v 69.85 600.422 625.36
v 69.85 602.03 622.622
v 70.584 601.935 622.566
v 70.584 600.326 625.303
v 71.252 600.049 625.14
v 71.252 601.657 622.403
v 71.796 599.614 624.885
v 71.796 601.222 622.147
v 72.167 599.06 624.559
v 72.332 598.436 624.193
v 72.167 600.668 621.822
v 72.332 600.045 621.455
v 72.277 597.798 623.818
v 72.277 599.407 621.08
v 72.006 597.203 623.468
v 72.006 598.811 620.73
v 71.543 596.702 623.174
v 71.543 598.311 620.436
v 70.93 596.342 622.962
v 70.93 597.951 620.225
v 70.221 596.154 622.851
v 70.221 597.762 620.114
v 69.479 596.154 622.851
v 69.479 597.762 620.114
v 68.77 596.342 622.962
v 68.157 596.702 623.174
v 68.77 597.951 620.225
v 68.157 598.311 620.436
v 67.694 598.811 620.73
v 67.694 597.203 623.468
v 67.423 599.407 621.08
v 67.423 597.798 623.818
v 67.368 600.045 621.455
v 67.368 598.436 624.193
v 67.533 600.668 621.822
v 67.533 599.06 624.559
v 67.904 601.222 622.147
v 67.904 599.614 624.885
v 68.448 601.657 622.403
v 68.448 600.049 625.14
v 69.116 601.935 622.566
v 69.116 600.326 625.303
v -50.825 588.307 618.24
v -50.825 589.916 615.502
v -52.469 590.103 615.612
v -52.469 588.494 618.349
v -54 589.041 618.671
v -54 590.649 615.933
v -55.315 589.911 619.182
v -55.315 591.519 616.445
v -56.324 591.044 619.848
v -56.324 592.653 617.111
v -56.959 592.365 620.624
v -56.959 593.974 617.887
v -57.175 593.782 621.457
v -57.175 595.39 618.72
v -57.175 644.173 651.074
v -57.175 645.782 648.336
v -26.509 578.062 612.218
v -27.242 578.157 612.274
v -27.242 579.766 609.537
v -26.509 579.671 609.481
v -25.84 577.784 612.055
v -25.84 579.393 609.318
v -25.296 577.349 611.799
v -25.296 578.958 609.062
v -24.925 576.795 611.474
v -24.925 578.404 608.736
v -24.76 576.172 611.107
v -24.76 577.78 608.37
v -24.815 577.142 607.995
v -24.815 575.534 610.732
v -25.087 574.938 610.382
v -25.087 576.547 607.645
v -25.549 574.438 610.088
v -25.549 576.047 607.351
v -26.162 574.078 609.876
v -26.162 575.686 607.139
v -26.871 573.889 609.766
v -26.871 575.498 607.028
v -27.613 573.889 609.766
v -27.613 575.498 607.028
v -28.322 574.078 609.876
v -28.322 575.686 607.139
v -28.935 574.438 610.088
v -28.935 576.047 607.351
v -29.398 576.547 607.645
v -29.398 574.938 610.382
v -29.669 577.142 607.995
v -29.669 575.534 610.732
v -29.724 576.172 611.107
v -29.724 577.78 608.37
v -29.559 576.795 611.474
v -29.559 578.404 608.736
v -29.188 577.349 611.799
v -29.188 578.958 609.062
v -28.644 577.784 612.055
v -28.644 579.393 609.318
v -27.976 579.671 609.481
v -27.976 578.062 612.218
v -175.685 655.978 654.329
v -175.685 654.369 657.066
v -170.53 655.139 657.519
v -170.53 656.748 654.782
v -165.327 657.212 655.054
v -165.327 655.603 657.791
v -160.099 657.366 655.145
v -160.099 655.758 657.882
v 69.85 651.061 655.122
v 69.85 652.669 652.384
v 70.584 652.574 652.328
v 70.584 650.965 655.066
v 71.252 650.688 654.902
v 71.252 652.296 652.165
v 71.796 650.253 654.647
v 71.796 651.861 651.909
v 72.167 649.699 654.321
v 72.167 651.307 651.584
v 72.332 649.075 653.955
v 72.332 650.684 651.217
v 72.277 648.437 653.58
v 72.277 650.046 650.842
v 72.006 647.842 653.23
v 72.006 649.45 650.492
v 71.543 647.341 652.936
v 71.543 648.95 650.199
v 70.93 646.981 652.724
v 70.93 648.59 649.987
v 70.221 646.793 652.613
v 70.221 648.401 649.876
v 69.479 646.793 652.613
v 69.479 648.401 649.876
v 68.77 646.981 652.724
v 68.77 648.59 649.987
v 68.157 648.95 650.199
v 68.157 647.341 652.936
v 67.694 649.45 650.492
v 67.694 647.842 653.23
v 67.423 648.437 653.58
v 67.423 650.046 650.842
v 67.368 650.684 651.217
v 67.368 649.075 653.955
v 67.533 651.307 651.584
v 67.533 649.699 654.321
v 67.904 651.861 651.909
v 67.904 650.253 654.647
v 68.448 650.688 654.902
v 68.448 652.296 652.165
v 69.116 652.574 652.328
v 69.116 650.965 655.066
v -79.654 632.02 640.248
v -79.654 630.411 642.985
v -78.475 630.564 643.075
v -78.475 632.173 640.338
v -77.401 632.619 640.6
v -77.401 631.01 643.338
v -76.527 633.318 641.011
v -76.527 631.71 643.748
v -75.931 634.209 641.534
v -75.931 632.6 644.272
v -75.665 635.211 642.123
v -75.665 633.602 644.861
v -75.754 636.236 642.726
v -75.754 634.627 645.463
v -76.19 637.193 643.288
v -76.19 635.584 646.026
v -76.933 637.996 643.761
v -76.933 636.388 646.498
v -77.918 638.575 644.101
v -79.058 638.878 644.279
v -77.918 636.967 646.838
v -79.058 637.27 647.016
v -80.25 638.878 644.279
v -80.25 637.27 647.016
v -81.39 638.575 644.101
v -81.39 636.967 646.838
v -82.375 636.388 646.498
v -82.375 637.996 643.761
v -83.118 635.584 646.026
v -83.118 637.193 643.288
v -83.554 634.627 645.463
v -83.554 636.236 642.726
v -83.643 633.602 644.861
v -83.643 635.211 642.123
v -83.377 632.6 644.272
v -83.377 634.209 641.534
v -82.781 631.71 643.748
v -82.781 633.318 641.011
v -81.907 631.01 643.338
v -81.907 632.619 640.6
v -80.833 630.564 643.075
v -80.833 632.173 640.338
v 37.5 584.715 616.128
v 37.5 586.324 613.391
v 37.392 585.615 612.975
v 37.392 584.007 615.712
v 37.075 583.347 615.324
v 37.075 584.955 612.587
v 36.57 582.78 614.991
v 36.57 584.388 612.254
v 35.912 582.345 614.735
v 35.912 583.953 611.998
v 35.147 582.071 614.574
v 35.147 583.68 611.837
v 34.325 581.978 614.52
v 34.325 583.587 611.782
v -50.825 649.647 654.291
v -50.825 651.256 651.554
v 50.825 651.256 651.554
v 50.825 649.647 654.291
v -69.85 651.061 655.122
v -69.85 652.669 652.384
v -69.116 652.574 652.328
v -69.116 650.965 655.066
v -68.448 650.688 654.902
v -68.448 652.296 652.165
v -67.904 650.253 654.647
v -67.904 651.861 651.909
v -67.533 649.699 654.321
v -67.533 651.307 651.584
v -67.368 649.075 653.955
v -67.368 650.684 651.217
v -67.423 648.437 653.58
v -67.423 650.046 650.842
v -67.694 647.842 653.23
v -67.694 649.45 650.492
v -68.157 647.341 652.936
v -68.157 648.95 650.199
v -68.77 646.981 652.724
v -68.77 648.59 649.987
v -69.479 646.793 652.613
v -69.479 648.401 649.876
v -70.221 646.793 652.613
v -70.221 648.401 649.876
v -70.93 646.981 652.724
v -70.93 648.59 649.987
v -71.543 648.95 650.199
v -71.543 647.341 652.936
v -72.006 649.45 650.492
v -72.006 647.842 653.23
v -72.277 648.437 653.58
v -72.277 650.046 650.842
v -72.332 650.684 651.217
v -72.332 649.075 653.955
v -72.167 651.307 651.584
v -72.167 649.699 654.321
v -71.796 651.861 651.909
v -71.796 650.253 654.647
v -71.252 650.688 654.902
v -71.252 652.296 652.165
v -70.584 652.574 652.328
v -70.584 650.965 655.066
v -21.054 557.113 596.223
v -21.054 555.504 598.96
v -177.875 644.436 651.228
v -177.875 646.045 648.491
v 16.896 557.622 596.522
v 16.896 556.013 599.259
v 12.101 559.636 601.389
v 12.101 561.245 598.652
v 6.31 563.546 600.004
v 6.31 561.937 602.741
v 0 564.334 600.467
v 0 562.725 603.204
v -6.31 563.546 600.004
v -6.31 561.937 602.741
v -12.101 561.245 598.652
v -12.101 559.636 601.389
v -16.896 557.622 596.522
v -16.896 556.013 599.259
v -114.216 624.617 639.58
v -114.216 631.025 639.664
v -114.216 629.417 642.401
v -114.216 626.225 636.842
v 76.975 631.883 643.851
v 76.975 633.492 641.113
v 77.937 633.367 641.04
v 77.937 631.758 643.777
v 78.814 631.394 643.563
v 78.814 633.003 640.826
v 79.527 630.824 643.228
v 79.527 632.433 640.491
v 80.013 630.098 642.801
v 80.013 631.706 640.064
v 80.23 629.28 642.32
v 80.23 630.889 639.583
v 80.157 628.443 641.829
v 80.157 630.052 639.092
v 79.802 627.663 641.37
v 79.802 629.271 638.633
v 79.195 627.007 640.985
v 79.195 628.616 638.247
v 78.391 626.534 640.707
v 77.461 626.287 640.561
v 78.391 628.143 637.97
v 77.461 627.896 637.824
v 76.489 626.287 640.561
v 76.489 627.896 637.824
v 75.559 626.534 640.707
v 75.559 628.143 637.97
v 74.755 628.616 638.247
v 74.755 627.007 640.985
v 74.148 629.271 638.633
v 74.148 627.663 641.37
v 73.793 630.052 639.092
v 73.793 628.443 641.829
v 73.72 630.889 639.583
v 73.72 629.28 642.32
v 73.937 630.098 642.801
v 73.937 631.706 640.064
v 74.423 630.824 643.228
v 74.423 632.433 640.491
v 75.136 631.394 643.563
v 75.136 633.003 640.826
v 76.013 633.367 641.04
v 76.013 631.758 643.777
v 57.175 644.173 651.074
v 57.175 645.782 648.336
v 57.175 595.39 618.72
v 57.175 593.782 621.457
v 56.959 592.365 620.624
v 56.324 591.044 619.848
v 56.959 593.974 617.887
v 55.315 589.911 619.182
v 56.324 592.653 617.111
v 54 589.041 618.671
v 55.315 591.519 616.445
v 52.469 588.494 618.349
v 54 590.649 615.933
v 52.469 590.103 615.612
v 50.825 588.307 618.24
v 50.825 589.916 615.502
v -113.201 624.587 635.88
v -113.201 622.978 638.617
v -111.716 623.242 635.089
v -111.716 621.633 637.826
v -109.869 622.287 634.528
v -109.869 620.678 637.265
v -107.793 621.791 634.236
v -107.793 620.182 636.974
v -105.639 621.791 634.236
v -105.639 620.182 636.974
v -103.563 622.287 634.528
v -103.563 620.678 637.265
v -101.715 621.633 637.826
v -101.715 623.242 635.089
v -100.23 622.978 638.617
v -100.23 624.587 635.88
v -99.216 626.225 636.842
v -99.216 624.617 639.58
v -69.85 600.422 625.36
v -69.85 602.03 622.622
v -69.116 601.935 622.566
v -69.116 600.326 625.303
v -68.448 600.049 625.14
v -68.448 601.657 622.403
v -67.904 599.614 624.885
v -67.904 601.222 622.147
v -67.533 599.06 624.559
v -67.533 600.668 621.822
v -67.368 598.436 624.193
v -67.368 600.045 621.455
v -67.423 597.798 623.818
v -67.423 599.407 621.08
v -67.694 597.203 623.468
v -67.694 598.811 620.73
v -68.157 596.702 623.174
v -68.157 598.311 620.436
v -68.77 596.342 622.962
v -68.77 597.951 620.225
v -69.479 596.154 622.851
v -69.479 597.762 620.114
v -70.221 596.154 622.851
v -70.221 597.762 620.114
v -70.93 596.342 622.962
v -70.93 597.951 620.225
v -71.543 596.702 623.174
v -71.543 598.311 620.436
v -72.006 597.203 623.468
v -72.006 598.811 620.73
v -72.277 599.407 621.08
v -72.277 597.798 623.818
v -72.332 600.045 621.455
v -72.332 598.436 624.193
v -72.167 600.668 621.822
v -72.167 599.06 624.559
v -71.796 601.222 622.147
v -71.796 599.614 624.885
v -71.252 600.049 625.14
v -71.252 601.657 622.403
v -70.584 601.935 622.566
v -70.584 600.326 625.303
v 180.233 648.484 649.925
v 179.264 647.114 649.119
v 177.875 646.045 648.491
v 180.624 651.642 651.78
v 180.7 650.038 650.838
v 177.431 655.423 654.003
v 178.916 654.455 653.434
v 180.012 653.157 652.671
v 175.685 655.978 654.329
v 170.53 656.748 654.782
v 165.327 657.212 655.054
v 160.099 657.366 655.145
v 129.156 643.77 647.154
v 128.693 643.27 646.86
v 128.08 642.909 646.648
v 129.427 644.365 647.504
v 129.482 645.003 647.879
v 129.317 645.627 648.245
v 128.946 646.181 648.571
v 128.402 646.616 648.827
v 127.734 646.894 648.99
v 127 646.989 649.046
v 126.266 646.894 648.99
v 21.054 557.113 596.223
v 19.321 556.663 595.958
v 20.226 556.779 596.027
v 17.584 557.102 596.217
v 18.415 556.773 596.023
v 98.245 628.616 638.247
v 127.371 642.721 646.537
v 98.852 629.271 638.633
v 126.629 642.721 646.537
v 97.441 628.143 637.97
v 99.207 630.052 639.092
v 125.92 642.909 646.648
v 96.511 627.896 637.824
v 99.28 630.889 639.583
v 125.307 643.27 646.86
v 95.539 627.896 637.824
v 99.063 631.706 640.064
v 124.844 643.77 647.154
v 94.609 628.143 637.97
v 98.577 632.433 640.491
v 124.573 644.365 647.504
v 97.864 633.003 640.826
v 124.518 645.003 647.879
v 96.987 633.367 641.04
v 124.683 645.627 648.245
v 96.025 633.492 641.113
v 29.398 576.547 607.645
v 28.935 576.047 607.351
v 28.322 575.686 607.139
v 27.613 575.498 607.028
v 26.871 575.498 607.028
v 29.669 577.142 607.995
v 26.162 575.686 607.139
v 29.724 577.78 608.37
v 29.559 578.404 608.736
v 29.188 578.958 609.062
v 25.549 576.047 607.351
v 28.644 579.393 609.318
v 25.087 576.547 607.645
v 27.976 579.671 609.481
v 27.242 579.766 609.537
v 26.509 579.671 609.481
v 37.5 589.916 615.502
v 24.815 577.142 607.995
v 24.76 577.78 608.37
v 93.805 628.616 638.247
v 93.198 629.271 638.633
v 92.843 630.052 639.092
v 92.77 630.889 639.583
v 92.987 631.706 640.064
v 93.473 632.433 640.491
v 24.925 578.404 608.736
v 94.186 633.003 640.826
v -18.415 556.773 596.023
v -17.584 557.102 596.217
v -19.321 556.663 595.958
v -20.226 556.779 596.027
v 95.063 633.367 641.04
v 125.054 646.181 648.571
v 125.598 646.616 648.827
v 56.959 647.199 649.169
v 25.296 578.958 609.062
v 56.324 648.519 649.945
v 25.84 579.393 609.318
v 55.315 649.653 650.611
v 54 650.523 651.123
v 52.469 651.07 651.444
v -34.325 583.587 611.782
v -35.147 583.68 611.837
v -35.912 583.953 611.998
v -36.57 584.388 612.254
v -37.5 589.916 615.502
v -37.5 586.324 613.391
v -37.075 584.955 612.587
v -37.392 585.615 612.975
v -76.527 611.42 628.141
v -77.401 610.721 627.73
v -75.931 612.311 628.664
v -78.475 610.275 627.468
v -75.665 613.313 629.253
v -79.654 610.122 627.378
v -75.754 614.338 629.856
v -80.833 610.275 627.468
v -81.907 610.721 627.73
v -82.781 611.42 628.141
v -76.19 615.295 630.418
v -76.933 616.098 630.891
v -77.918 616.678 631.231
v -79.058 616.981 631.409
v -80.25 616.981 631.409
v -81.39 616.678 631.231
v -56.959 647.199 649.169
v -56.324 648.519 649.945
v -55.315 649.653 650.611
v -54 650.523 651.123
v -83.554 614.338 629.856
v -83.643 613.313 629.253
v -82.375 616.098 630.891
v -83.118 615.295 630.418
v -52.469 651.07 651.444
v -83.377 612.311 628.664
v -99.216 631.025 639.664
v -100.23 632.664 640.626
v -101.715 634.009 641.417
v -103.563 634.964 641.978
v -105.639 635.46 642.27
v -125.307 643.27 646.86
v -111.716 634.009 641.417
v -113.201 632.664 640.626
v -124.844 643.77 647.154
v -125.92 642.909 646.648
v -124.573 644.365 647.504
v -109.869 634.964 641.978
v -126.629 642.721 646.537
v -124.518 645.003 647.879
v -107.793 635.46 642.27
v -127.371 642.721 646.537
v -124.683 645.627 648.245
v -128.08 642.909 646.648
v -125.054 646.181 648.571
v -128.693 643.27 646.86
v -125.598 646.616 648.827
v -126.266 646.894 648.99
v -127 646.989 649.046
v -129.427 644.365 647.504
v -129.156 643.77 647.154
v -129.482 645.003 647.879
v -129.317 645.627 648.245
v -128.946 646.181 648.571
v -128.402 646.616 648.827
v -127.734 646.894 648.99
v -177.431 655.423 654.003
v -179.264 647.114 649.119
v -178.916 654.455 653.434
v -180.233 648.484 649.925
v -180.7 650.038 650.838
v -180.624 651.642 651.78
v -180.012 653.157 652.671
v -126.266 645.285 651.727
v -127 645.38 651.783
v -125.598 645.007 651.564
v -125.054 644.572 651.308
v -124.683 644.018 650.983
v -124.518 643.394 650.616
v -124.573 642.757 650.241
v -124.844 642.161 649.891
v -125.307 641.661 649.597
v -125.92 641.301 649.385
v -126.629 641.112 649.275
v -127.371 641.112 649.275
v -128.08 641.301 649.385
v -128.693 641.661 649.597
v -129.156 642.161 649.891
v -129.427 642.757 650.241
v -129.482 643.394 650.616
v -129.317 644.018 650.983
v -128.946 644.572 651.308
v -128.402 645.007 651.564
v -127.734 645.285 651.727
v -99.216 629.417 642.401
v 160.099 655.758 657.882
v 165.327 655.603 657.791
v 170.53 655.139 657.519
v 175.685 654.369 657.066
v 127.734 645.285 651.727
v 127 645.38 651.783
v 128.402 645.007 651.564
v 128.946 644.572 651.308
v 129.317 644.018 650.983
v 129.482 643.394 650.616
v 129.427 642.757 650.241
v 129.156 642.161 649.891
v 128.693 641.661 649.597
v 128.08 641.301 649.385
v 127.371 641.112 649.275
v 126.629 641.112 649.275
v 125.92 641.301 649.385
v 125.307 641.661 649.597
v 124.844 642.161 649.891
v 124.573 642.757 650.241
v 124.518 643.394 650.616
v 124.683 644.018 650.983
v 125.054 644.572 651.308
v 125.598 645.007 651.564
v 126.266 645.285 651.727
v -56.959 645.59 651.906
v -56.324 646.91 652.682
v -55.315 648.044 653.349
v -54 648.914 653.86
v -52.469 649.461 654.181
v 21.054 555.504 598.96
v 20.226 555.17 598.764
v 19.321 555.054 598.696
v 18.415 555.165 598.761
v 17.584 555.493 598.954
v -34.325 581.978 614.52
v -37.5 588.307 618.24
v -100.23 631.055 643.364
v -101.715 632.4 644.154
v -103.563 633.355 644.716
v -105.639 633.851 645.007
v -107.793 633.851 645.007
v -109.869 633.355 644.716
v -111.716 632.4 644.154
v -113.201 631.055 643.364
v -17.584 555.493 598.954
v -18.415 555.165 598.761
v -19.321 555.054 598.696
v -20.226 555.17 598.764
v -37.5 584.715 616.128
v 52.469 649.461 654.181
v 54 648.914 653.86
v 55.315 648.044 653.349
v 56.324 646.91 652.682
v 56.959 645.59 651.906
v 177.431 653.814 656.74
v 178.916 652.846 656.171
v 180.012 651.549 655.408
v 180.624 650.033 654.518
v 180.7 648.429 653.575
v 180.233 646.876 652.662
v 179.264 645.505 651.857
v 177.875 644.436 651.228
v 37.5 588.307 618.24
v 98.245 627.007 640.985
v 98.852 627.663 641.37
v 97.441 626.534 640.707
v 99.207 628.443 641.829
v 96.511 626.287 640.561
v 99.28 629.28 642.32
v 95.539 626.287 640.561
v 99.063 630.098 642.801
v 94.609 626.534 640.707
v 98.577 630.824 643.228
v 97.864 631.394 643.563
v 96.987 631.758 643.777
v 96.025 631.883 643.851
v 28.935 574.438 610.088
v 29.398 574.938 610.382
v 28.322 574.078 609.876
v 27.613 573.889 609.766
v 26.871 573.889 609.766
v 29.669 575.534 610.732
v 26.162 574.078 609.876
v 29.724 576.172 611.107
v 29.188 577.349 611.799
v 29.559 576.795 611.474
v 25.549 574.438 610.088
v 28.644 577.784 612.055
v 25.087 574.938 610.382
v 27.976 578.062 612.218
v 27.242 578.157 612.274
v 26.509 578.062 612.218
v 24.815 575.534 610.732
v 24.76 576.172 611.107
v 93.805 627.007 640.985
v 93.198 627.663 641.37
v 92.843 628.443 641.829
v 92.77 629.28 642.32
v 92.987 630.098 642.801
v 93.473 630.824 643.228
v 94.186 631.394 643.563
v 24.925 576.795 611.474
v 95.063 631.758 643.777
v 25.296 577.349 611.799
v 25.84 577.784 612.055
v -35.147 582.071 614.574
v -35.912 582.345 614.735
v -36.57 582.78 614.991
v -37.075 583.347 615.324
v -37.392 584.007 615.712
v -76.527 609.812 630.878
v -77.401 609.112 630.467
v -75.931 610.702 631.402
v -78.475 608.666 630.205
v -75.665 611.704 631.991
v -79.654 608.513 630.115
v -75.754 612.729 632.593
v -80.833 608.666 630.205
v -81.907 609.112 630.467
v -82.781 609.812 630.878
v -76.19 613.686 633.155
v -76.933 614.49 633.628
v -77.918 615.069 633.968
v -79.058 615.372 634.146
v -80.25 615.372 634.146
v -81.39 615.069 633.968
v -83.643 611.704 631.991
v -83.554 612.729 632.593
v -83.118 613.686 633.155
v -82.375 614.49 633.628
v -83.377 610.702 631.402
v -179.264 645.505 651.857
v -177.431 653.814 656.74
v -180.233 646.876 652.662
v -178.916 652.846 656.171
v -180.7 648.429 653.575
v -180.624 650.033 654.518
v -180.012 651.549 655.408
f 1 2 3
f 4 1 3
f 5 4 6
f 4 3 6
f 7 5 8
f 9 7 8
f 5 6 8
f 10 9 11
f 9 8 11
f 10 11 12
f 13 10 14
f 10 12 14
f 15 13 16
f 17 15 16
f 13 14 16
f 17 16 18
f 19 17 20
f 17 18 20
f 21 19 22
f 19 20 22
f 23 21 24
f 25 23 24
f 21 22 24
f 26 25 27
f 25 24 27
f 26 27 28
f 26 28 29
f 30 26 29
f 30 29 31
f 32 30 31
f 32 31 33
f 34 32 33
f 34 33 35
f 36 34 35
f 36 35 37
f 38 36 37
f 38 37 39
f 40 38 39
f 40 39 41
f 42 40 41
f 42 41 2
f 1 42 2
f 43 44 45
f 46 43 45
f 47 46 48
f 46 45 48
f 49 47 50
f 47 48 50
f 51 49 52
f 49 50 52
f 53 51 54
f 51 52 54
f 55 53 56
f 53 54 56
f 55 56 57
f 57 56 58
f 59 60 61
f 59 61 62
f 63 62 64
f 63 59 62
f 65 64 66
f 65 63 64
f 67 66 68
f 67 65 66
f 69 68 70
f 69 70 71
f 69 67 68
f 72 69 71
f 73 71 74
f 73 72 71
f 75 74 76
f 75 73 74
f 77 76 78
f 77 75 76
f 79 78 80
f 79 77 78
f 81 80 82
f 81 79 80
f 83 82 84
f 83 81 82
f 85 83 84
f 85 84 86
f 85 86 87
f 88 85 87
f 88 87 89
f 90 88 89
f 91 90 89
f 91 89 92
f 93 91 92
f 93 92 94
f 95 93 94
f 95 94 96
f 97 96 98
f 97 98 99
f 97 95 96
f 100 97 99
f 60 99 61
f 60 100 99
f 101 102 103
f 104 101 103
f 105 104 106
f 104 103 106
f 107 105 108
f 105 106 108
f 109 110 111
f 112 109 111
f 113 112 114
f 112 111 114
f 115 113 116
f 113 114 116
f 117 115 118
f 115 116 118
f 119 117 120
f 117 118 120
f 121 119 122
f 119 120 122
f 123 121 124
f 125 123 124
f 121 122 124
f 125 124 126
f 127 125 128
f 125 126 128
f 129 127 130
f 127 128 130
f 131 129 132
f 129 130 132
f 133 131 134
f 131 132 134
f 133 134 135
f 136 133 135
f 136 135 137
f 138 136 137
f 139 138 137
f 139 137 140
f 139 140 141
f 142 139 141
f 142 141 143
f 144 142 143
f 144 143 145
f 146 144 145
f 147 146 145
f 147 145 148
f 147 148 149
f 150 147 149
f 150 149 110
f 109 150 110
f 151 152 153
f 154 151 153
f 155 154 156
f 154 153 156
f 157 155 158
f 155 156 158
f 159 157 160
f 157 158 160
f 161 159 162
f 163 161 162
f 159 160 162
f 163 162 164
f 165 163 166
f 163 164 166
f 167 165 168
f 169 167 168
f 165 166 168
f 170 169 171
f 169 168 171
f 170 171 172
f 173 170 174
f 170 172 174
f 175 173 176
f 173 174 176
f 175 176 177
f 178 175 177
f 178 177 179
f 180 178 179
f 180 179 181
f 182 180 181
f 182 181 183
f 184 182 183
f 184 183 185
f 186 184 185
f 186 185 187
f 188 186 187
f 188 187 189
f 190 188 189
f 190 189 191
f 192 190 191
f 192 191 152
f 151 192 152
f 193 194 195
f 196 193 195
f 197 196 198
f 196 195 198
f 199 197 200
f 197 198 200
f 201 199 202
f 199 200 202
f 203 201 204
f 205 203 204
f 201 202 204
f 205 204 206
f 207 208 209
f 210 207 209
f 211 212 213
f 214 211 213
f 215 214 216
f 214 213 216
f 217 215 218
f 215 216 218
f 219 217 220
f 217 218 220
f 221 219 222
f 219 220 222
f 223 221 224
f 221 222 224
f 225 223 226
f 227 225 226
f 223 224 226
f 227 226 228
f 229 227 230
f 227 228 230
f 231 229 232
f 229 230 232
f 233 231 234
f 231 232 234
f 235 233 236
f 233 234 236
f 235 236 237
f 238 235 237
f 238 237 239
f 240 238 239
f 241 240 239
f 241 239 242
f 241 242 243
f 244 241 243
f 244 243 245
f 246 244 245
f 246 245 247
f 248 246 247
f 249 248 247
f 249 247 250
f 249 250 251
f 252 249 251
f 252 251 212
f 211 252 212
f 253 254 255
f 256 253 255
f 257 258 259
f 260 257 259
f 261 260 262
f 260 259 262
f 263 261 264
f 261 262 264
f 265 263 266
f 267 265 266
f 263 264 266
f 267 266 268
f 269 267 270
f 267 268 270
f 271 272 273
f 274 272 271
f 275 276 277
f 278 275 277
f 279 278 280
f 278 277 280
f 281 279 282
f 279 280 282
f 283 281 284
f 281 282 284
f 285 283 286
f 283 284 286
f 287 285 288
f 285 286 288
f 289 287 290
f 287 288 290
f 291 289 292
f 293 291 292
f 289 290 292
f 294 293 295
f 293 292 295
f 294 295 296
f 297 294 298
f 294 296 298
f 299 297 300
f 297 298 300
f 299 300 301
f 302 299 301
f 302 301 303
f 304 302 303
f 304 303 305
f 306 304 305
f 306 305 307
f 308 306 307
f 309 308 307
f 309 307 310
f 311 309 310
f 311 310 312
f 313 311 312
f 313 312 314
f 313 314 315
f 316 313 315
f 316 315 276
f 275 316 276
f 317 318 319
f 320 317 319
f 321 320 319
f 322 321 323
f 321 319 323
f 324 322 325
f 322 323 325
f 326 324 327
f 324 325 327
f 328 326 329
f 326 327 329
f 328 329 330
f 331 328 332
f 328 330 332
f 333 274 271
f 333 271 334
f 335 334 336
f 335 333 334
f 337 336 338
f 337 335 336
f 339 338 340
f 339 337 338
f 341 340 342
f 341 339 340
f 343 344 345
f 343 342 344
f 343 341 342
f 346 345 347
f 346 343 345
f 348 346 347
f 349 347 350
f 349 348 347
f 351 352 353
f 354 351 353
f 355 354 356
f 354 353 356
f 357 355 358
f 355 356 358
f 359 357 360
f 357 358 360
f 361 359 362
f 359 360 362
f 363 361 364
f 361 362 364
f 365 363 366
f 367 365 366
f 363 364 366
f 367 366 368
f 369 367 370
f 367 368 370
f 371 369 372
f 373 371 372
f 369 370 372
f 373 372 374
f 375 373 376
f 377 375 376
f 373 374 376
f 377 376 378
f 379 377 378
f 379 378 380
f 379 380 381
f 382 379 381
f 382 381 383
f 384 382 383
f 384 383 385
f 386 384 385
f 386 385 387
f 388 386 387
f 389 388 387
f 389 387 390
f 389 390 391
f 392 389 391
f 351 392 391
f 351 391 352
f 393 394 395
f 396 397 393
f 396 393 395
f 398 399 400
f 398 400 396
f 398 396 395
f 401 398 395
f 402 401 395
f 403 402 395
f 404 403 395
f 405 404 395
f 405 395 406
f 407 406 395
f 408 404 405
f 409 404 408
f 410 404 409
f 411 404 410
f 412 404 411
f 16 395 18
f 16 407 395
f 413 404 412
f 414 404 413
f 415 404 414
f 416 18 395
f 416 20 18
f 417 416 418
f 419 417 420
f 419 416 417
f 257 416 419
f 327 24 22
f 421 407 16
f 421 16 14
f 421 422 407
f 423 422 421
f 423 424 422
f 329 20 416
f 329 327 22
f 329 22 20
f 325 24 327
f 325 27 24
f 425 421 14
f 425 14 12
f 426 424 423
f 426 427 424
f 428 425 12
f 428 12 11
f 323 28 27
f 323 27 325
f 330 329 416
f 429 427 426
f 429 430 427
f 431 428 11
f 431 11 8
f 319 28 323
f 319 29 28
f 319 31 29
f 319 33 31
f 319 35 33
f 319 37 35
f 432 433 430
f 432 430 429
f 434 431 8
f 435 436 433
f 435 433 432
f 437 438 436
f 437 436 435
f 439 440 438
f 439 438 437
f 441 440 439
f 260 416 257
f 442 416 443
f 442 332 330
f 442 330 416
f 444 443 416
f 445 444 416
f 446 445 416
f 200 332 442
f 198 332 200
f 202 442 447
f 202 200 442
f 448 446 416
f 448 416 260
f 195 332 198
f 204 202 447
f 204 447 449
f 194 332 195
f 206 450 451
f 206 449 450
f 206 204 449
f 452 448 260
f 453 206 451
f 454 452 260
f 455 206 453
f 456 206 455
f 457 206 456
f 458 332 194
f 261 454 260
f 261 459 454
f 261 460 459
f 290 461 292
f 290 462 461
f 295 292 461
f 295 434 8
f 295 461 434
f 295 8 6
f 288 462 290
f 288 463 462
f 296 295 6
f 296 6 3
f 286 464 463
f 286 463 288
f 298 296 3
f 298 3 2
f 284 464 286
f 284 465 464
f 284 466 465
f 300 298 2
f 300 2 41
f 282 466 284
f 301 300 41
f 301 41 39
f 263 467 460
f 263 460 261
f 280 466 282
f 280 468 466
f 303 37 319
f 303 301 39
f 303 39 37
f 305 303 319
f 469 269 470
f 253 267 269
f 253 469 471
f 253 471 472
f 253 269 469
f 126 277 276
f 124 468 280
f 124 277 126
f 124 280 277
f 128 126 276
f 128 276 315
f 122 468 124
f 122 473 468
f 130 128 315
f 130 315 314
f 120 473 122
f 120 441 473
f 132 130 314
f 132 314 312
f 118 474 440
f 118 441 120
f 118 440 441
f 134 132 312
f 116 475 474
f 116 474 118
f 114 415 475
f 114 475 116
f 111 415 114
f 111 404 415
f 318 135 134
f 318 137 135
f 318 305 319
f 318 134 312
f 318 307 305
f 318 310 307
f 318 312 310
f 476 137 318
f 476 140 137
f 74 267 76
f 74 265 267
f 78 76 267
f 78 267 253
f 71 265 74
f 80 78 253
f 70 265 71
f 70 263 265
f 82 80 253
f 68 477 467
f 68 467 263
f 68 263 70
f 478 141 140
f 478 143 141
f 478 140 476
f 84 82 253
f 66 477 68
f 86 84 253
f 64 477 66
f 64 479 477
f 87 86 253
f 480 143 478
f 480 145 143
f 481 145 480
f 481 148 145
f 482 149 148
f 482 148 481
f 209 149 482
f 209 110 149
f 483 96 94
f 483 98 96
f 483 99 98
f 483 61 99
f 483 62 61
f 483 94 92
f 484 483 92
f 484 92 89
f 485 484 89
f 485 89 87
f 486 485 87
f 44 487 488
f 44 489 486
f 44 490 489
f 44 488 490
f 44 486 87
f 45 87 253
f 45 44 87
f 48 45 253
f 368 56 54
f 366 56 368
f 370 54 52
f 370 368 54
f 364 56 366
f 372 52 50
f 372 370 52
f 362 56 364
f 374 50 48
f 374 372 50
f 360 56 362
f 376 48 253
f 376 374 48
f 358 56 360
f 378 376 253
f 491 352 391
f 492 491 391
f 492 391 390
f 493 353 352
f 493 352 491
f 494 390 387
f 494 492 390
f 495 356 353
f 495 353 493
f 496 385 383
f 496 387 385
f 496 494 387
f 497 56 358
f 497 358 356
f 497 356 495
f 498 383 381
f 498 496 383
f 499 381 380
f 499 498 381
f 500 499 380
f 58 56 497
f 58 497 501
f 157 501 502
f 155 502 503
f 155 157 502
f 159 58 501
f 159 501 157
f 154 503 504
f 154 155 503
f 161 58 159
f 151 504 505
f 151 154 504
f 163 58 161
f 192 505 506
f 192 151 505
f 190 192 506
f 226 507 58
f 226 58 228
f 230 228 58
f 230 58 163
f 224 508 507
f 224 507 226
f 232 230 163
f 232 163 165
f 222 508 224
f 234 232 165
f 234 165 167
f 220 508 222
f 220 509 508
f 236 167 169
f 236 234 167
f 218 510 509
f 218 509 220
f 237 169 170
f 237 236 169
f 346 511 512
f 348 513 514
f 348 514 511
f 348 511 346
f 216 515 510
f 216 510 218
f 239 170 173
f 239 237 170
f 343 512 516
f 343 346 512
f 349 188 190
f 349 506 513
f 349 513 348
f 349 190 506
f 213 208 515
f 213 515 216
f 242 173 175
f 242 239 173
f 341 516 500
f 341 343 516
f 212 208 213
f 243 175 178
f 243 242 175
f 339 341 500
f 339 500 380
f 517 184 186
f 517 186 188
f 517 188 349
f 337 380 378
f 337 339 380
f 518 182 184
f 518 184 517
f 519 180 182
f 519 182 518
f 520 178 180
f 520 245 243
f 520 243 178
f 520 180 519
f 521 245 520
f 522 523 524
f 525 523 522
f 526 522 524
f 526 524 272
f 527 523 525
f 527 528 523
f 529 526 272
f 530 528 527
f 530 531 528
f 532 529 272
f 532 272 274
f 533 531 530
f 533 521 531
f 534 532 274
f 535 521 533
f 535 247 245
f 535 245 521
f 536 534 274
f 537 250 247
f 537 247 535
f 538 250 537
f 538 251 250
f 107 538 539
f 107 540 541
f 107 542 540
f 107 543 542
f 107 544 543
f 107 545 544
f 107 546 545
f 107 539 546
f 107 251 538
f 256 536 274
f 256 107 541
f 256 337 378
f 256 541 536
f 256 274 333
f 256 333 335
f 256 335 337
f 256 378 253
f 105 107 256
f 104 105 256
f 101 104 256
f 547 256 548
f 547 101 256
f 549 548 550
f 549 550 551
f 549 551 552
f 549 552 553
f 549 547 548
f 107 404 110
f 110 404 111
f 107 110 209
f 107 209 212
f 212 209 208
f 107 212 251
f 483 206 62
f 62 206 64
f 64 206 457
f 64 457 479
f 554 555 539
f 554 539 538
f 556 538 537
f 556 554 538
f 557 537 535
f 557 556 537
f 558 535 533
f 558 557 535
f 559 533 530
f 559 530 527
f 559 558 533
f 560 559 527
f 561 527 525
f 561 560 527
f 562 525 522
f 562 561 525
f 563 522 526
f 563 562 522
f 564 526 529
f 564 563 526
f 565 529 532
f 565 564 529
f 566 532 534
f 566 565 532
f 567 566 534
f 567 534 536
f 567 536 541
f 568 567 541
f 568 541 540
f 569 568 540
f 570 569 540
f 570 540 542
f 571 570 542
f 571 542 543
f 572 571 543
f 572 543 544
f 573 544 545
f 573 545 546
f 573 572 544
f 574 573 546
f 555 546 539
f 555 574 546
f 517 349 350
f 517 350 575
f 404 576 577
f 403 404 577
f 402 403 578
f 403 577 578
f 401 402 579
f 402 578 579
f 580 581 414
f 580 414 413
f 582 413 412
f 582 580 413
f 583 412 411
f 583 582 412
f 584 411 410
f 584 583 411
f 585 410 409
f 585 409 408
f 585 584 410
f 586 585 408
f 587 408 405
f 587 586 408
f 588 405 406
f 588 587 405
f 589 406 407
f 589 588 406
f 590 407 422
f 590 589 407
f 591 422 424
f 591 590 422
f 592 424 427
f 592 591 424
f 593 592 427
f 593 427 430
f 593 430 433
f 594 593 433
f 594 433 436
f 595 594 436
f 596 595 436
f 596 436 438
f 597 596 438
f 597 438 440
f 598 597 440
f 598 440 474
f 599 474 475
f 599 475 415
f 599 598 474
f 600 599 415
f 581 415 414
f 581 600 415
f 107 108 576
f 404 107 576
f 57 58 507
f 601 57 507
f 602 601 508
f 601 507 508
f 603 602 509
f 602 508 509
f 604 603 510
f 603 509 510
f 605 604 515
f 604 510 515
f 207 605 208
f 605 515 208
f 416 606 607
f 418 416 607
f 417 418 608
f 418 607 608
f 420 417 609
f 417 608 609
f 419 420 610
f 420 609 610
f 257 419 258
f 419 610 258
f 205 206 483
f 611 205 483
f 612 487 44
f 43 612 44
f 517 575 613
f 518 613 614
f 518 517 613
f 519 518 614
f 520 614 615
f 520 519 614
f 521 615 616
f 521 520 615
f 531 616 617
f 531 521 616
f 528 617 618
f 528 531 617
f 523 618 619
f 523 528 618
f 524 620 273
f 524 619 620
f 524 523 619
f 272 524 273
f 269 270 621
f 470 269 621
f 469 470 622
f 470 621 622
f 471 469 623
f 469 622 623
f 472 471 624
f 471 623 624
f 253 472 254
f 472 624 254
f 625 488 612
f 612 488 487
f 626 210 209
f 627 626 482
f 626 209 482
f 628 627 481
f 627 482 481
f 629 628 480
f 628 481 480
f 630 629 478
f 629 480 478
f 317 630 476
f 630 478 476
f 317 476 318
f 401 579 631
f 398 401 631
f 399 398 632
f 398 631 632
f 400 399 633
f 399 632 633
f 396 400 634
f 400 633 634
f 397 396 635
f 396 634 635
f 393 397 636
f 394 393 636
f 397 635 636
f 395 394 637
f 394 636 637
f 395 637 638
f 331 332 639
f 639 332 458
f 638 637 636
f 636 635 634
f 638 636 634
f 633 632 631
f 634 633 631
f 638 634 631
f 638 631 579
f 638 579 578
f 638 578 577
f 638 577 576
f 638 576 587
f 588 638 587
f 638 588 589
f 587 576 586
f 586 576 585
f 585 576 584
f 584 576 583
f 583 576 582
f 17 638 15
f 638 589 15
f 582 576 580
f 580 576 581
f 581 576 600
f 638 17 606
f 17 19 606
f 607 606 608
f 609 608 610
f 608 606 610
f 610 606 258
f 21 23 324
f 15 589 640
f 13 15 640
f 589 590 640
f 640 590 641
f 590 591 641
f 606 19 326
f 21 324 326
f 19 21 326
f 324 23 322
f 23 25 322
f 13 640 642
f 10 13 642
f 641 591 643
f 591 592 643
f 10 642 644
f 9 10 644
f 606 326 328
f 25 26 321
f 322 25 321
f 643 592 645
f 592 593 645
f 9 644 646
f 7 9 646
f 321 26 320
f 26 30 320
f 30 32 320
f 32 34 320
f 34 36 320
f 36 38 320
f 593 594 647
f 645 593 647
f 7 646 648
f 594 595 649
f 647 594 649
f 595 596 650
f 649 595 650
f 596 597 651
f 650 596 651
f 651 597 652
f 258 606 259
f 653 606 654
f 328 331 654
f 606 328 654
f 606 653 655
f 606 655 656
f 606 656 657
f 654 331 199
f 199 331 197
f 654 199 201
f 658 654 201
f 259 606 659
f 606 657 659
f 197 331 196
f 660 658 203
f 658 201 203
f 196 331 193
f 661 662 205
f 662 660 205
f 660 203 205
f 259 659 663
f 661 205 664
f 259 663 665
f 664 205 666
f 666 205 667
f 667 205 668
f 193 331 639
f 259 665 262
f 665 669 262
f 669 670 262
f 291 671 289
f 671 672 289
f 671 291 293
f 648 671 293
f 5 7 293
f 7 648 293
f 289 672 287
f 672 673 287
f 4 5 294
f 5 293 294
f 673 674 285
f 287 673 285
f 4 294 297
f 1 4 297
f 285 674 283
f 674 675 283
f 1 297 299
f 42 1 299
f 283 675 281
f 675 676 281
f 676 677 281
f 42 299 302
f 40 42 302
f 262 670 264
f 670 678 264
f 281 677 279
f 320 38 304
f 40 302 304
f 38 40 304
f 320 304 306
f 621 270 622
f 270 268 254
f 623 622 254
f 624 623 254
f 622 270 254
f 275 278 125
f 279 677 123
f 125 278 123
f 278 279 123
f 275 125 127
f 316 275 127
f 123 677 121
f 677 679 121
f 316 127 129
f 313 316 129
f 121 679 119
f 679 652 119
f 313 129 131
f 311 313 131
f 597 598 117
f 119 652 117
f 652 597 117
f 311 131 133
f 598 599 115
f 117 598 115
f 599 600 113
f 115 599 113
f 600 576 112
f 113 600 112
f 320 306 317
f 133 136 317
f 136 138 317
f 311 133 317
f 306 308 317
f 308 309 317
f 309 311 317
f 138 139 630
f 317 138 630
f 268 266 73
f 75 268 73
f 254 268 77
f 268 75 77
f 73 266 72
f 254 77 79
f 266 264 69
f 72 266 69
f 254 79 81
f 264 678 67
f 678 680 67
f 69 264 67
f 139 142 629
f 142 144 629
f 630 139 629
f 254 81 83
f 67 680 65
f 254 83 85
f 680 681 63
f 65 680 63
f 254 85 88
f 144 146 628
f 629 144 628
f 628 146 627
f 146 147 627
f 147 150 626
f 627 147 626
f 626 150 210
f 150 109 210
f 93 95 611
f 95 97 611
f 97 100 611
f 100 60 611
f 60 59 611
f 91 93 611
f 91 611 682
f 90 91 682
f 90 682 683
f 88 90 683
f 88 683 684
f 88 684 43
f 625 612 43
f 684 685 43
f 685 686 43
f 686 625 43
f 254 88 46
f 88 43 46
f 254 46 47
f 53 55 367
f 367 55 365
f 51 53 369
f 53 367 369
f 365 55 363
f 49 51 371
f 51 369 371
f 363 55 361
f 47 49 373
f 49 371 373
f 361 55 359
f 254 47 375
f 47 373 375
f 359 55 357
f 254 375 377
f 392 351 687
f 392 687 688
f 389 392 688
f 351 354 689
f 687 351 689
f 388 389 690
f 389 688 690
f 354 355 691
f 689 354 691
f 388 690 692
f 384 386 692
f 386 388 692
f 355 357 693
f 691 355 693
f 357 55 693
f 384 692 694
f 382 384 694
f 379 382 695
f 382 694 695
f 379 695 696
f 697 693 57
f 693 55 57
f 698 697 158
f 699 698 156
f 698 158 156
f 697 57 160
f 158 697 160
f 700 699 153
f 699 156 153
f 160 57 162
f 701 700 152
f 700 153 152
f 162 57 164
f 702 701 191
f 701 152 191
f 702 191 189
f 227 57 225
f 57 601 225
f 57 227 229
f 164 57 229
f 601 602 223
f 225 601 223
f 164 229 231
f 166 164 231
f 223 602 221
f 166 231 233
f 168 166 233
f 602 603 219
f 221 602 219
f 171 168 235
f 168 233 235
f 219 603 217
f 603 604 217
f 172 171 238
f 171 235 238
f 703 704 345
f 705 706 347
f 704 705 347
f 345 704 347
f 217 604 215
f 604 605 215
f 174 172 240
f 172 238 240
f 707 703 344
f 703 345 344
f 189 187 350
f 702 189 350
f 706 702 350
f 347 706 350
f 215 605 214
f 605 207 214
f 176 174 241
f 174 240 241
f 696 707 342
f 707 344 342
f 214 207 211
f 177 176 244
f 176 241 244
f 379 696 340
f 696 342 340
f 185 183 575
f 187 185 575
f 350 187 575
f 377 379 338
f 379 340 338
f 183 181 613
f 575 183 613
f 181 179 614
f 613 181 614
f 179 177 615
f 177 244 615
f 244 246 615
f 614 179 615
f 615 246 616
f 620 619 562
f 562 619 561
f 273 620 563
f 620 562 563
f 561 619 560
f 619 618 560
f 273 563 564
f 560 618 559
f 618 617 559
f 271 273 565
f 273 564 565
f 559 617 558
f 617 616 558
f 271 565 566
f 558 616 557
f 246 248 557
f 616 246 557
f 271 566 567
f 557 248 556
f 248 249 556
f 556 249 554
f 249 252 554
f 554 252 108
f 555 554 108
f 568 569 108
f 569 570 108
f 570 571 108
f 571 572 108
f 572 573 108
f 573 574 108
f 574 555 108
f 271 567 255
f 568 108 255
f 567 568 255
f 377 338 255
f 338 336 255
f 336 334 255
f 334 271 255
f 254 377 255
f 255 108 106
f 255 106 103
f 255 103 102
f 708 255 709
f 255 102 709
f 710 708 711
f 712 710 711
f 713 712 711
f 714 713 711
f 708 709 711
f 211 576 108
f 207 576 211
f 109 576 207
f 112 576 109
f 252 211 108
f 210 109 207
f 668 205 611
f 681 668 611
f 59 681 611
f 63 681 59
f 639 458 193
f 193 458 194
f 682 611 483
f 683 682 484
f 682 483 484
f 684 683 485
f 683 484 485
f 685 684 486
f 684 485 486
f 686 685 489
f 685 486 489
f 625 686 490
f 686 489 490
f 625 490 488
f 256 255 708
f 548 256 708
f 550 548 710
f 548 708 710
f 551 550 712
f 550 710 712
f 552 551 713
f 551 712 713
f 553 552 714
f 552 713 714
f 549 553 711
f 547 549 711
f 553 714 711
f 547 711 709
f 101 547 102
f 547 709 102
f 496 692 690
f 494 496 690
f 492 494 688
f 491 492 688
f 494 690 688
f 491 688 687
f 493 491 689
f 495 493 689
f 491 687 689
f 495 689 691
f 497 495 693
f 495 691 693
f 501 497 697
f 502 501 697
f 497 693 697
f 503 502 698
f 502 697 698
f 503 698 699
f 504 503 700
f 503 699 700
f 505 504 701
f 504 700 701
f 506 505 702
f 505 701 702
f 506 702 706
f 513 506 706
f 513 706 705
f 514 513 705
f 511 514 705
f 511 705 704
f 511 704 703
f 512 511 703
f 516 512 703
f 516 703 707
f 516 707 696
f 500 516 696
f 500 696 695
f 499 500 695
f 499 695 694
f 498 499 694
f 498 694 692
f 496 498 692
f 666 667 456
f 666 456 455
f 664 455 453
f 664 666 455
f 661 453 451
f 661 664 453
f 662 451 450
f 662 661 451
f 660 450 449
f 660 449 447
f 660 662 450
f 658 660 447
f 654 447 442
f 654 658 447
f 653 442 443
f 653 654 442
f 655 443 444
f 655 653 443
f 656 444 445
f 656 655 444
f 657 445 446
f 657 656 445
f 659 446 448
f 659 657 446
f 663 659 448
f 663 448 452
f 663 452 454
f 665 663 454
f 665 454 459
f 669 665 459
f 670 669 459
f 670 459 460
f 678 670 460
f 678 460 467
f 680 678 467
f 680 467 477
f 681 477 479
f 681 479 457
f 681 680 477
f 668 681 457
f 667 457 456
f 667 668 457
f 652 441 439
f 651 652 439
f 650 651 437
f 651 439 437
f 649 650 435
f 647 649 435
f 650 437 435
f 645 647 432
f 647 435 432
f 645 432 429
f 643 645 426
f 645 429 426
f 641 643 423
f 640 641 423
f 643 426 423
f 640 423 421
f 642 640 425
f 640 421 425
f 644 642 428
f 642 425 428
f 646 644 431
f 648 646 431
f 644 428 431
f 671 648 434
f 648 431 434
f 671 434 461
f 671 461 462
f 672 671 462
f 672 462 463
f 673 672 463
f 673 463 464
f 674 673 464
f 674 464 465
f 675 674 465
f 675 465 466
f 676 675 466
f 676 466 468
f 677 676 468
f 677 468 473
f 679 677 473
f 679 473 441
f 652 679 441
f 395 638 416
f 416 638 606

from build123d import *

# Parameters (mm, degrees)
SKETCH2_R           = 2.4892
BOSS_EXTRUDE1_DEPTH = 3.175
SKETCH4_R           = 2.4892
CUT_EXTRUDE1_DEPTH  = 919.047972743
SKETCH6_R           = 4
CUT_EXTRUDE3_DEPTH  = 919.045301638
CUT_EXTRUDE2_DEPTH  = 919.047972743
SKETCH7_R           = 3.2639
CUT_EXTRUDE4_DEPTH  = 919.047972743
CUT_EXTRUDE5_DEPTH  = 919.047972743


with BuildPart() as part:
    # Sketch2 → Boss-Extrude1 (new body)
    with BuildSketch(Plane(origin=(0, -119.026177706, 202.518411263), x_dir=(-1, 0, 0), z_dir=(-7.267823095607155e-15, 0.506696551391541, -0.8621244717602671))):
        with BuildLine():
            Line((21.054229278, 782.405033139), (177.875467972, 885.559604741))
            ThreePointArc((177.875467972, 885.559604741), (180.62401835, 892.051058523), (175.684594577, 897.080531077))
            ThreePointArc((175.684594577, 897.080531077), (167.933410831, 898.287628232), (160.099198372, 898.691420443))
            Line((160.099198372, 898.691420443), (-160.099198372, 898.691420443))
            ThreePointArc((-160.099198372, 898.691420443), (-167.933410831, 898.287628232), (-175.684594577, 897.080531077))
            ThreePointArc((-175.684594577, 897.080531077), (-180.62401835, 892.051058523), (-177.875467972, 885.559604741))
            Line((-177.875467972, 885.559604741), (-21.054229278, 782.405033139))
            ThreePointArc((-21.054229278, 782.405033139), (-18.86350312, 781.91408365), (-16.895725938, 782.994900685))
            ThreePointArc((-16.895725938, 782.994900685), (0, 790.780888599), (16.895725938, 782.994900685))
            ThreePointArc((16.895725938, 782.994900685), (18.86350312, 781.91408365), (21.054229278, 782.405033139))
        make_face()
        with Locations((-127, 884.16502092)):
            Circle(SKETCH2_R, mode=Mode.SUBTRACT)
        with Locations((-27.242242795, 806.191391474)):
            Circle(SKETCH2_R, mode=Mode.SUBTRACT)
        with Locations((27.242242795, 806.191391474)):
            Circle(SKETCH2_R, mode=Mode.SUBTRACT)
        with Locations((127, 884.16502092)):
            Circle(SKETCH2_R, mode=Mode.SUBTRACT)
    extrude(amount=BOSS_EXTRUDE1_DEPTH)

    # Sketch4 → Cut-Extrude1 (cut, through all)
    with BuildSketch(Plane(origin=(0, -117.417416155, 199.781166065), x_dir=(-1, 0, 0), z_dir=(-7.267823095607155e-15, 0.506696551391541, -0.8621244717602671))):
        with Locations((-69.85, 890.753920443)):
            Circle(SKETCH4_R)
        with Locations((-69.85, 832.016420443)):
            Circle(SKETCH4_R)
        with Locations((69.85, 832.016420443)):
            Circle(SKETCH4_R)
        with Locations((69.85, 890.753920443)):
            Circle(SKETCH4_R)
    extrude(amount=-CUT_EXTRUDE1_DEPTH, mode=Mode.SUBTRACT)

    # Sketch6 → Cut-Extrude3 (cut, through all)
    with BuildSketch(Plane(origin=(0, -119.026177706, 202.518411263), x_dir=(1, 0, 0), z_dir=(7.267823095607155e-15, -0.506696551391541, 0.8621244717602671))):
        with Locations((-79.654, 873.291420443)):
            Circle(SKETCH6_R)
        with Locations((-79.654, 847.891420443)):
            Circle(SKETCH6_R)
    extrude(amount=-CUT_EXTRUDE3_DEPTH, mode=Mode.SUBTRACT)

    # Sketch5 → Cut-Extrude2 (cut, through all)
    with BuildSketch(Plane(origin=(0, -117.417416155, 199.781166065), x_dir=(-1, 0, 0), z_dir=(-7.267823095607155e-15, 0.506696551391541, -0.8621244717602671))):
        with BuildLine():
            Line((99.215659501, 862.570038261), (99.215659501, 868.137802624))
            ThreePointArc((99.215659501, 868.137802624), (106.715659501, 873.353920443), (114.215659501, 868.137802624))
            Line((114.215659501, 868.137802624), (114.215659501, 862.570038261))
            ThreePointArc((114.215659501, 862.570038261), (106.715659501, 857.353920443), (99.215659501, 862.570038261))
        make_face()
    extrude(amount=-CUT_EXTRUDE2_DEPTH, mode=Mode.SUBTRACT)

    # Sketch7 → Cut-Extrude4 (cut, through all)
    with BuildSketch(Plane(origin=(0, -117.417416155, 199.781166065), x_dir=(-1, 0, 0), z_dir=(-7.267823095607155e-15, 0.506696551391541, -0.8621244717602671))):
        with Locations((-76.975, 867.735170443)):
            Circle(SKETCH7_R)
        with Locations((-96.025, 867.735170443)):
            Circle(SKETCH7_R)
    extrude(amount=-CUT_EXTRUDE4_DEPTH, mode=Mode.SUBTRACT)

    # Sketch8 → Cut-Extrude5 (cut, through all)
    with BuildSketch(Plane(origin=(0, -117.417416155, 199.781166065), x_dir=(-1, 0, 0), z_dir=(-7.267823095607155e-15, 0.506696551391541, -0.8621244717602671))):
        with BuildLine():
            Line((50.825, 891.603920443), (-50.825, 891.603920443))
            ThreePointArc((-50.825, 891.603920443), (-55.315128061, 889.744048503), (-57.175, 885.253920443))
            Line((-57.175, 885.253920443), (-57.175, 826.803920443))
            ThreePointArc((-57.175, 826.803920443), (-55.315128061, 822.313792382), (-50.825, 820.453920443))
            Line((-50.825, 820.453920443), (-37.5, 820.453920443))
            Line((-37.5, 820.453920443), (-37.5, 816.287420443))
            ThreePointArc((-37.5, 816.287420443), (-36.57006403, 814.042356413), (-34.325, 813.112420443))
            Line((-34.325, 813.112420443), (34.325, 813.112420443))
            ThreePointArc((34.325, 813.112420443), (36.57006403, 814.042356413), (37.5, 816.287420443))
            Line((37.5, 816.287420443), (37.5, 820.453920443))
            Line((37.5, 820.453920443), (50.825, 820.453920443))
            ThreePointArc((50.825, 820.453920443), (55.315128061, 822.313792382), (57.175, 826.803920443))
            Line((57.175, 826.803920443), (57.175, 885.253920443))
            ThreePointArc((57.175, 885.253920443), (55.315128061, 889.744048503), (50.825, 891.603920443))
        make_face()
    extrude(amount=-CUT_EXTRUDE5_DEPTH, mode=Mode.SUBTRACT)


solid = part.part
